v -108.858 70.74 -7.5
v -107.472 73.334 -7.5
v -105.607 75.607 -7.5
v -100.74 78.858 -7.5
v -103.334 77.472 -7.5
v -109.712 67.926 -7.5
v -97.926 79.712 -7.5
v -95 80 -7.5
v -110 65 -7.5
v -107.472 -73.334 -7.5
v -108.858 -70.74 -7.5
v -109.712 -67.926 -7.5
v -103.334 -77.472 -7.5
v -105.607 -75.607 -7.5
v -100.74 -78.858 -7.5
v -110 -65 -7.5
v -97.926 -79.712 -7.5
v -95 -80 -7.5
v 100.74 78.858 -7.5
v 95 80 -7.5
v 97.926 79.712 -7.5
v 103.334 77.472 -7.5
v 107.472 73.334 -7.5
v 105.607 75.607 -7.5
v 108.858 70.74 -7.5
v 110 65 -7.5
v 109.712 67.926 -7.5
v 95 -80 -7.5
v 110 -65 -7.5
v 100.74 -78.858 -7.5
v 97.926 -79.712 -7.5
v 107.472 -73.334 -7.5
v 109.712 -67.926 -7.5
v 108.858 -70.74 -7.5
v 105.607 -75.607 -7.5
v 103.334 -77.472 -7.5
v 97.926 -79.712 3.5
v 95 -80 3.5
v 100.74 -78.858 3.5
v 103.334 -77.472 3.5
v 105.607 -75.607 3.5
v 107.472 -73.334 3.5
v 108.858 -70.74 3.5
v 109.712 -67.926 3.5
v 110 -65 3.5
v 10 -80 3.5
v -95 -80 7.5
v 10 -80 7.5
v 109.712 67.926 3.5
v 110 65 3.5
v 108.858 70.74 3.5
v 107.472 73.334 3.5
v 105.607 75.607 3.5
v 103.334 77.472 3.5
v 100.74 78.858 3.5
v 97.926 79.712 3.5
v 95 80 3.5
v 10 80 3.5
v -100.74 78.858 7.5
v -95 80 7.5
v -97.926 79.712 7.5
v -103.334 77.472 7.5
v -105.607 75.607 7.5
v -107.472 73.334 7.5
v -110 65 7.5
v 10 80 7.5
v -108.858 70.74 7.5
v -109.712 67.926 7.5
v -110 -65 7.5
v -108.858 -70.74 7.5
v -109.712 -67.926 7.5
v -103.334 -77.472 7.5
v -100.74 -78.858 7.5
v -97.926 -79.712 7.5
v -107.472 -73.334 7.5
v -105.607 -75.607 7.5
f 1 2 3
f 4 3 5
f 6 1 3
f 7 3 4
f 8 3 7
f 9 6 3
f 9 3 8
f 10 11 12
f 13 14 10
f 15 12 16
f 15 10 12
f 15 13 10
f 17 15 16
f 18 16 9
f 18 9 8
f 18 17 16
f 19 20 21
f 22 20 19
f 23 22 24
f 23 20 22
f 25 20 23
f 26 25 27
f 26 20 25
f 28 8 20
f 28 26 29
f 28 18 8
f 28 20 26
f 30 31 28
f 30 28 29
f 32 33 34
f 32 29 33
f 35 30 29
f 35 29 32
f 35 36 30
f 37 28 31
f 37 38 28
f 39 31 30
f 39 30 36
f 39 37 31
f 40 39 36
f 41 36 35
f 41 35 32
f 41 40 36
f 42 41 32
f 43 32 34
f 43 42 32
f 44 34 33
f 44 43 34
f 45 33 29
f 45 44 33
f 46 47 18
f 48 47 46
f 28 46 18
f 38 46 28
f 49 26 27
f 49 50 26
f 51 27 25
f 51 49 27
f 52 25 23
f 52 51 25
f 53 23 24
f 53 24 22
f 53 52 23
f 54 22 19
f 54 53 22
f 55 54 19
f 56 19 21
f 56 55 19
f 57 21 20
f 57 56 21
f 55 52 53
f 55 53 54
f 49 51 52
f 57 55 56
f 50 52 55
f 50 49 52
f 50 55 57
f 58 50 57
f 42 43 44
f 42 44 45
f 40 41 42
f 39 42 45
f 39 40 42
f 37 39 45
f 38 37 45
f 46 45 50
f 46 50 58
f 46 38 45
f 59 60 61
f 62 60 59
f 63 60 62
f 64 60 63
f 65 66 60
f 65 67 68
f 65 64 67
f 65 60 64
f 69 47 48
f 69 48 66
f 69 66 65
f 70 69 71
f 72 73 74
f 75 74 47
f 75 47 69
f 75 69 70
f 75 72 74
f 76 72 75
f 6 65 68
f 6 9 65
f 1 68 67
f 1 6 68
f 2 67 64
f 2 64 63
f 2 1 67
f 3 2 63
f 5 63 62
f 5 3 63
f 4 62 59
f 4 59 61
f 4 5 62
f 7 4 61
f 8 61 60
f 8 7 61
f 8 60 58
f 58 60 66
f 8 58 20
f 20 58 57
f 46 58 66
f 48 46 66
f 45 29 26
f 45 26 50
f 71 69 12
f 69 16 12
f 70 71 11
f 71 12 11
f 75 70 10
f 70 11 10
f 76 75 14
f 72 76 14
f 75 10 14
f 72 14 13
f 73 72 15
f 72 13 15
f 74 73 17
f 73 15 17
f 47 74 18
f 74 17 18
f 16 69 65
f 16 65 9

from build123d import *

# Parameters (mm, degrees)
F1_DEPTH = 80
F2_R     = 15


with BuildPart() as f1:
    # F0 (on Front) → F1 (new body, symmetric)
    with BuildSketch(Plane.XZ):
        Polygon((-110, -7.5), (110, -7.5), (110, 3.5), (10, 3.5), (10, 7.5), (-110, 7.5), align=None)
    extrude(amount=F1_DEPTH, both=True)

    # F2
    f2_edges = [f1.edges().sort_by_distance(p)[0] for p in [
        (-110, -80, 0),
        (110, -80, -2),
        (110, 80, -2),
        (-110, 80, 0),
    ]]
    fillet(f2_edges, radius=F2_R)


solid = f1.part
